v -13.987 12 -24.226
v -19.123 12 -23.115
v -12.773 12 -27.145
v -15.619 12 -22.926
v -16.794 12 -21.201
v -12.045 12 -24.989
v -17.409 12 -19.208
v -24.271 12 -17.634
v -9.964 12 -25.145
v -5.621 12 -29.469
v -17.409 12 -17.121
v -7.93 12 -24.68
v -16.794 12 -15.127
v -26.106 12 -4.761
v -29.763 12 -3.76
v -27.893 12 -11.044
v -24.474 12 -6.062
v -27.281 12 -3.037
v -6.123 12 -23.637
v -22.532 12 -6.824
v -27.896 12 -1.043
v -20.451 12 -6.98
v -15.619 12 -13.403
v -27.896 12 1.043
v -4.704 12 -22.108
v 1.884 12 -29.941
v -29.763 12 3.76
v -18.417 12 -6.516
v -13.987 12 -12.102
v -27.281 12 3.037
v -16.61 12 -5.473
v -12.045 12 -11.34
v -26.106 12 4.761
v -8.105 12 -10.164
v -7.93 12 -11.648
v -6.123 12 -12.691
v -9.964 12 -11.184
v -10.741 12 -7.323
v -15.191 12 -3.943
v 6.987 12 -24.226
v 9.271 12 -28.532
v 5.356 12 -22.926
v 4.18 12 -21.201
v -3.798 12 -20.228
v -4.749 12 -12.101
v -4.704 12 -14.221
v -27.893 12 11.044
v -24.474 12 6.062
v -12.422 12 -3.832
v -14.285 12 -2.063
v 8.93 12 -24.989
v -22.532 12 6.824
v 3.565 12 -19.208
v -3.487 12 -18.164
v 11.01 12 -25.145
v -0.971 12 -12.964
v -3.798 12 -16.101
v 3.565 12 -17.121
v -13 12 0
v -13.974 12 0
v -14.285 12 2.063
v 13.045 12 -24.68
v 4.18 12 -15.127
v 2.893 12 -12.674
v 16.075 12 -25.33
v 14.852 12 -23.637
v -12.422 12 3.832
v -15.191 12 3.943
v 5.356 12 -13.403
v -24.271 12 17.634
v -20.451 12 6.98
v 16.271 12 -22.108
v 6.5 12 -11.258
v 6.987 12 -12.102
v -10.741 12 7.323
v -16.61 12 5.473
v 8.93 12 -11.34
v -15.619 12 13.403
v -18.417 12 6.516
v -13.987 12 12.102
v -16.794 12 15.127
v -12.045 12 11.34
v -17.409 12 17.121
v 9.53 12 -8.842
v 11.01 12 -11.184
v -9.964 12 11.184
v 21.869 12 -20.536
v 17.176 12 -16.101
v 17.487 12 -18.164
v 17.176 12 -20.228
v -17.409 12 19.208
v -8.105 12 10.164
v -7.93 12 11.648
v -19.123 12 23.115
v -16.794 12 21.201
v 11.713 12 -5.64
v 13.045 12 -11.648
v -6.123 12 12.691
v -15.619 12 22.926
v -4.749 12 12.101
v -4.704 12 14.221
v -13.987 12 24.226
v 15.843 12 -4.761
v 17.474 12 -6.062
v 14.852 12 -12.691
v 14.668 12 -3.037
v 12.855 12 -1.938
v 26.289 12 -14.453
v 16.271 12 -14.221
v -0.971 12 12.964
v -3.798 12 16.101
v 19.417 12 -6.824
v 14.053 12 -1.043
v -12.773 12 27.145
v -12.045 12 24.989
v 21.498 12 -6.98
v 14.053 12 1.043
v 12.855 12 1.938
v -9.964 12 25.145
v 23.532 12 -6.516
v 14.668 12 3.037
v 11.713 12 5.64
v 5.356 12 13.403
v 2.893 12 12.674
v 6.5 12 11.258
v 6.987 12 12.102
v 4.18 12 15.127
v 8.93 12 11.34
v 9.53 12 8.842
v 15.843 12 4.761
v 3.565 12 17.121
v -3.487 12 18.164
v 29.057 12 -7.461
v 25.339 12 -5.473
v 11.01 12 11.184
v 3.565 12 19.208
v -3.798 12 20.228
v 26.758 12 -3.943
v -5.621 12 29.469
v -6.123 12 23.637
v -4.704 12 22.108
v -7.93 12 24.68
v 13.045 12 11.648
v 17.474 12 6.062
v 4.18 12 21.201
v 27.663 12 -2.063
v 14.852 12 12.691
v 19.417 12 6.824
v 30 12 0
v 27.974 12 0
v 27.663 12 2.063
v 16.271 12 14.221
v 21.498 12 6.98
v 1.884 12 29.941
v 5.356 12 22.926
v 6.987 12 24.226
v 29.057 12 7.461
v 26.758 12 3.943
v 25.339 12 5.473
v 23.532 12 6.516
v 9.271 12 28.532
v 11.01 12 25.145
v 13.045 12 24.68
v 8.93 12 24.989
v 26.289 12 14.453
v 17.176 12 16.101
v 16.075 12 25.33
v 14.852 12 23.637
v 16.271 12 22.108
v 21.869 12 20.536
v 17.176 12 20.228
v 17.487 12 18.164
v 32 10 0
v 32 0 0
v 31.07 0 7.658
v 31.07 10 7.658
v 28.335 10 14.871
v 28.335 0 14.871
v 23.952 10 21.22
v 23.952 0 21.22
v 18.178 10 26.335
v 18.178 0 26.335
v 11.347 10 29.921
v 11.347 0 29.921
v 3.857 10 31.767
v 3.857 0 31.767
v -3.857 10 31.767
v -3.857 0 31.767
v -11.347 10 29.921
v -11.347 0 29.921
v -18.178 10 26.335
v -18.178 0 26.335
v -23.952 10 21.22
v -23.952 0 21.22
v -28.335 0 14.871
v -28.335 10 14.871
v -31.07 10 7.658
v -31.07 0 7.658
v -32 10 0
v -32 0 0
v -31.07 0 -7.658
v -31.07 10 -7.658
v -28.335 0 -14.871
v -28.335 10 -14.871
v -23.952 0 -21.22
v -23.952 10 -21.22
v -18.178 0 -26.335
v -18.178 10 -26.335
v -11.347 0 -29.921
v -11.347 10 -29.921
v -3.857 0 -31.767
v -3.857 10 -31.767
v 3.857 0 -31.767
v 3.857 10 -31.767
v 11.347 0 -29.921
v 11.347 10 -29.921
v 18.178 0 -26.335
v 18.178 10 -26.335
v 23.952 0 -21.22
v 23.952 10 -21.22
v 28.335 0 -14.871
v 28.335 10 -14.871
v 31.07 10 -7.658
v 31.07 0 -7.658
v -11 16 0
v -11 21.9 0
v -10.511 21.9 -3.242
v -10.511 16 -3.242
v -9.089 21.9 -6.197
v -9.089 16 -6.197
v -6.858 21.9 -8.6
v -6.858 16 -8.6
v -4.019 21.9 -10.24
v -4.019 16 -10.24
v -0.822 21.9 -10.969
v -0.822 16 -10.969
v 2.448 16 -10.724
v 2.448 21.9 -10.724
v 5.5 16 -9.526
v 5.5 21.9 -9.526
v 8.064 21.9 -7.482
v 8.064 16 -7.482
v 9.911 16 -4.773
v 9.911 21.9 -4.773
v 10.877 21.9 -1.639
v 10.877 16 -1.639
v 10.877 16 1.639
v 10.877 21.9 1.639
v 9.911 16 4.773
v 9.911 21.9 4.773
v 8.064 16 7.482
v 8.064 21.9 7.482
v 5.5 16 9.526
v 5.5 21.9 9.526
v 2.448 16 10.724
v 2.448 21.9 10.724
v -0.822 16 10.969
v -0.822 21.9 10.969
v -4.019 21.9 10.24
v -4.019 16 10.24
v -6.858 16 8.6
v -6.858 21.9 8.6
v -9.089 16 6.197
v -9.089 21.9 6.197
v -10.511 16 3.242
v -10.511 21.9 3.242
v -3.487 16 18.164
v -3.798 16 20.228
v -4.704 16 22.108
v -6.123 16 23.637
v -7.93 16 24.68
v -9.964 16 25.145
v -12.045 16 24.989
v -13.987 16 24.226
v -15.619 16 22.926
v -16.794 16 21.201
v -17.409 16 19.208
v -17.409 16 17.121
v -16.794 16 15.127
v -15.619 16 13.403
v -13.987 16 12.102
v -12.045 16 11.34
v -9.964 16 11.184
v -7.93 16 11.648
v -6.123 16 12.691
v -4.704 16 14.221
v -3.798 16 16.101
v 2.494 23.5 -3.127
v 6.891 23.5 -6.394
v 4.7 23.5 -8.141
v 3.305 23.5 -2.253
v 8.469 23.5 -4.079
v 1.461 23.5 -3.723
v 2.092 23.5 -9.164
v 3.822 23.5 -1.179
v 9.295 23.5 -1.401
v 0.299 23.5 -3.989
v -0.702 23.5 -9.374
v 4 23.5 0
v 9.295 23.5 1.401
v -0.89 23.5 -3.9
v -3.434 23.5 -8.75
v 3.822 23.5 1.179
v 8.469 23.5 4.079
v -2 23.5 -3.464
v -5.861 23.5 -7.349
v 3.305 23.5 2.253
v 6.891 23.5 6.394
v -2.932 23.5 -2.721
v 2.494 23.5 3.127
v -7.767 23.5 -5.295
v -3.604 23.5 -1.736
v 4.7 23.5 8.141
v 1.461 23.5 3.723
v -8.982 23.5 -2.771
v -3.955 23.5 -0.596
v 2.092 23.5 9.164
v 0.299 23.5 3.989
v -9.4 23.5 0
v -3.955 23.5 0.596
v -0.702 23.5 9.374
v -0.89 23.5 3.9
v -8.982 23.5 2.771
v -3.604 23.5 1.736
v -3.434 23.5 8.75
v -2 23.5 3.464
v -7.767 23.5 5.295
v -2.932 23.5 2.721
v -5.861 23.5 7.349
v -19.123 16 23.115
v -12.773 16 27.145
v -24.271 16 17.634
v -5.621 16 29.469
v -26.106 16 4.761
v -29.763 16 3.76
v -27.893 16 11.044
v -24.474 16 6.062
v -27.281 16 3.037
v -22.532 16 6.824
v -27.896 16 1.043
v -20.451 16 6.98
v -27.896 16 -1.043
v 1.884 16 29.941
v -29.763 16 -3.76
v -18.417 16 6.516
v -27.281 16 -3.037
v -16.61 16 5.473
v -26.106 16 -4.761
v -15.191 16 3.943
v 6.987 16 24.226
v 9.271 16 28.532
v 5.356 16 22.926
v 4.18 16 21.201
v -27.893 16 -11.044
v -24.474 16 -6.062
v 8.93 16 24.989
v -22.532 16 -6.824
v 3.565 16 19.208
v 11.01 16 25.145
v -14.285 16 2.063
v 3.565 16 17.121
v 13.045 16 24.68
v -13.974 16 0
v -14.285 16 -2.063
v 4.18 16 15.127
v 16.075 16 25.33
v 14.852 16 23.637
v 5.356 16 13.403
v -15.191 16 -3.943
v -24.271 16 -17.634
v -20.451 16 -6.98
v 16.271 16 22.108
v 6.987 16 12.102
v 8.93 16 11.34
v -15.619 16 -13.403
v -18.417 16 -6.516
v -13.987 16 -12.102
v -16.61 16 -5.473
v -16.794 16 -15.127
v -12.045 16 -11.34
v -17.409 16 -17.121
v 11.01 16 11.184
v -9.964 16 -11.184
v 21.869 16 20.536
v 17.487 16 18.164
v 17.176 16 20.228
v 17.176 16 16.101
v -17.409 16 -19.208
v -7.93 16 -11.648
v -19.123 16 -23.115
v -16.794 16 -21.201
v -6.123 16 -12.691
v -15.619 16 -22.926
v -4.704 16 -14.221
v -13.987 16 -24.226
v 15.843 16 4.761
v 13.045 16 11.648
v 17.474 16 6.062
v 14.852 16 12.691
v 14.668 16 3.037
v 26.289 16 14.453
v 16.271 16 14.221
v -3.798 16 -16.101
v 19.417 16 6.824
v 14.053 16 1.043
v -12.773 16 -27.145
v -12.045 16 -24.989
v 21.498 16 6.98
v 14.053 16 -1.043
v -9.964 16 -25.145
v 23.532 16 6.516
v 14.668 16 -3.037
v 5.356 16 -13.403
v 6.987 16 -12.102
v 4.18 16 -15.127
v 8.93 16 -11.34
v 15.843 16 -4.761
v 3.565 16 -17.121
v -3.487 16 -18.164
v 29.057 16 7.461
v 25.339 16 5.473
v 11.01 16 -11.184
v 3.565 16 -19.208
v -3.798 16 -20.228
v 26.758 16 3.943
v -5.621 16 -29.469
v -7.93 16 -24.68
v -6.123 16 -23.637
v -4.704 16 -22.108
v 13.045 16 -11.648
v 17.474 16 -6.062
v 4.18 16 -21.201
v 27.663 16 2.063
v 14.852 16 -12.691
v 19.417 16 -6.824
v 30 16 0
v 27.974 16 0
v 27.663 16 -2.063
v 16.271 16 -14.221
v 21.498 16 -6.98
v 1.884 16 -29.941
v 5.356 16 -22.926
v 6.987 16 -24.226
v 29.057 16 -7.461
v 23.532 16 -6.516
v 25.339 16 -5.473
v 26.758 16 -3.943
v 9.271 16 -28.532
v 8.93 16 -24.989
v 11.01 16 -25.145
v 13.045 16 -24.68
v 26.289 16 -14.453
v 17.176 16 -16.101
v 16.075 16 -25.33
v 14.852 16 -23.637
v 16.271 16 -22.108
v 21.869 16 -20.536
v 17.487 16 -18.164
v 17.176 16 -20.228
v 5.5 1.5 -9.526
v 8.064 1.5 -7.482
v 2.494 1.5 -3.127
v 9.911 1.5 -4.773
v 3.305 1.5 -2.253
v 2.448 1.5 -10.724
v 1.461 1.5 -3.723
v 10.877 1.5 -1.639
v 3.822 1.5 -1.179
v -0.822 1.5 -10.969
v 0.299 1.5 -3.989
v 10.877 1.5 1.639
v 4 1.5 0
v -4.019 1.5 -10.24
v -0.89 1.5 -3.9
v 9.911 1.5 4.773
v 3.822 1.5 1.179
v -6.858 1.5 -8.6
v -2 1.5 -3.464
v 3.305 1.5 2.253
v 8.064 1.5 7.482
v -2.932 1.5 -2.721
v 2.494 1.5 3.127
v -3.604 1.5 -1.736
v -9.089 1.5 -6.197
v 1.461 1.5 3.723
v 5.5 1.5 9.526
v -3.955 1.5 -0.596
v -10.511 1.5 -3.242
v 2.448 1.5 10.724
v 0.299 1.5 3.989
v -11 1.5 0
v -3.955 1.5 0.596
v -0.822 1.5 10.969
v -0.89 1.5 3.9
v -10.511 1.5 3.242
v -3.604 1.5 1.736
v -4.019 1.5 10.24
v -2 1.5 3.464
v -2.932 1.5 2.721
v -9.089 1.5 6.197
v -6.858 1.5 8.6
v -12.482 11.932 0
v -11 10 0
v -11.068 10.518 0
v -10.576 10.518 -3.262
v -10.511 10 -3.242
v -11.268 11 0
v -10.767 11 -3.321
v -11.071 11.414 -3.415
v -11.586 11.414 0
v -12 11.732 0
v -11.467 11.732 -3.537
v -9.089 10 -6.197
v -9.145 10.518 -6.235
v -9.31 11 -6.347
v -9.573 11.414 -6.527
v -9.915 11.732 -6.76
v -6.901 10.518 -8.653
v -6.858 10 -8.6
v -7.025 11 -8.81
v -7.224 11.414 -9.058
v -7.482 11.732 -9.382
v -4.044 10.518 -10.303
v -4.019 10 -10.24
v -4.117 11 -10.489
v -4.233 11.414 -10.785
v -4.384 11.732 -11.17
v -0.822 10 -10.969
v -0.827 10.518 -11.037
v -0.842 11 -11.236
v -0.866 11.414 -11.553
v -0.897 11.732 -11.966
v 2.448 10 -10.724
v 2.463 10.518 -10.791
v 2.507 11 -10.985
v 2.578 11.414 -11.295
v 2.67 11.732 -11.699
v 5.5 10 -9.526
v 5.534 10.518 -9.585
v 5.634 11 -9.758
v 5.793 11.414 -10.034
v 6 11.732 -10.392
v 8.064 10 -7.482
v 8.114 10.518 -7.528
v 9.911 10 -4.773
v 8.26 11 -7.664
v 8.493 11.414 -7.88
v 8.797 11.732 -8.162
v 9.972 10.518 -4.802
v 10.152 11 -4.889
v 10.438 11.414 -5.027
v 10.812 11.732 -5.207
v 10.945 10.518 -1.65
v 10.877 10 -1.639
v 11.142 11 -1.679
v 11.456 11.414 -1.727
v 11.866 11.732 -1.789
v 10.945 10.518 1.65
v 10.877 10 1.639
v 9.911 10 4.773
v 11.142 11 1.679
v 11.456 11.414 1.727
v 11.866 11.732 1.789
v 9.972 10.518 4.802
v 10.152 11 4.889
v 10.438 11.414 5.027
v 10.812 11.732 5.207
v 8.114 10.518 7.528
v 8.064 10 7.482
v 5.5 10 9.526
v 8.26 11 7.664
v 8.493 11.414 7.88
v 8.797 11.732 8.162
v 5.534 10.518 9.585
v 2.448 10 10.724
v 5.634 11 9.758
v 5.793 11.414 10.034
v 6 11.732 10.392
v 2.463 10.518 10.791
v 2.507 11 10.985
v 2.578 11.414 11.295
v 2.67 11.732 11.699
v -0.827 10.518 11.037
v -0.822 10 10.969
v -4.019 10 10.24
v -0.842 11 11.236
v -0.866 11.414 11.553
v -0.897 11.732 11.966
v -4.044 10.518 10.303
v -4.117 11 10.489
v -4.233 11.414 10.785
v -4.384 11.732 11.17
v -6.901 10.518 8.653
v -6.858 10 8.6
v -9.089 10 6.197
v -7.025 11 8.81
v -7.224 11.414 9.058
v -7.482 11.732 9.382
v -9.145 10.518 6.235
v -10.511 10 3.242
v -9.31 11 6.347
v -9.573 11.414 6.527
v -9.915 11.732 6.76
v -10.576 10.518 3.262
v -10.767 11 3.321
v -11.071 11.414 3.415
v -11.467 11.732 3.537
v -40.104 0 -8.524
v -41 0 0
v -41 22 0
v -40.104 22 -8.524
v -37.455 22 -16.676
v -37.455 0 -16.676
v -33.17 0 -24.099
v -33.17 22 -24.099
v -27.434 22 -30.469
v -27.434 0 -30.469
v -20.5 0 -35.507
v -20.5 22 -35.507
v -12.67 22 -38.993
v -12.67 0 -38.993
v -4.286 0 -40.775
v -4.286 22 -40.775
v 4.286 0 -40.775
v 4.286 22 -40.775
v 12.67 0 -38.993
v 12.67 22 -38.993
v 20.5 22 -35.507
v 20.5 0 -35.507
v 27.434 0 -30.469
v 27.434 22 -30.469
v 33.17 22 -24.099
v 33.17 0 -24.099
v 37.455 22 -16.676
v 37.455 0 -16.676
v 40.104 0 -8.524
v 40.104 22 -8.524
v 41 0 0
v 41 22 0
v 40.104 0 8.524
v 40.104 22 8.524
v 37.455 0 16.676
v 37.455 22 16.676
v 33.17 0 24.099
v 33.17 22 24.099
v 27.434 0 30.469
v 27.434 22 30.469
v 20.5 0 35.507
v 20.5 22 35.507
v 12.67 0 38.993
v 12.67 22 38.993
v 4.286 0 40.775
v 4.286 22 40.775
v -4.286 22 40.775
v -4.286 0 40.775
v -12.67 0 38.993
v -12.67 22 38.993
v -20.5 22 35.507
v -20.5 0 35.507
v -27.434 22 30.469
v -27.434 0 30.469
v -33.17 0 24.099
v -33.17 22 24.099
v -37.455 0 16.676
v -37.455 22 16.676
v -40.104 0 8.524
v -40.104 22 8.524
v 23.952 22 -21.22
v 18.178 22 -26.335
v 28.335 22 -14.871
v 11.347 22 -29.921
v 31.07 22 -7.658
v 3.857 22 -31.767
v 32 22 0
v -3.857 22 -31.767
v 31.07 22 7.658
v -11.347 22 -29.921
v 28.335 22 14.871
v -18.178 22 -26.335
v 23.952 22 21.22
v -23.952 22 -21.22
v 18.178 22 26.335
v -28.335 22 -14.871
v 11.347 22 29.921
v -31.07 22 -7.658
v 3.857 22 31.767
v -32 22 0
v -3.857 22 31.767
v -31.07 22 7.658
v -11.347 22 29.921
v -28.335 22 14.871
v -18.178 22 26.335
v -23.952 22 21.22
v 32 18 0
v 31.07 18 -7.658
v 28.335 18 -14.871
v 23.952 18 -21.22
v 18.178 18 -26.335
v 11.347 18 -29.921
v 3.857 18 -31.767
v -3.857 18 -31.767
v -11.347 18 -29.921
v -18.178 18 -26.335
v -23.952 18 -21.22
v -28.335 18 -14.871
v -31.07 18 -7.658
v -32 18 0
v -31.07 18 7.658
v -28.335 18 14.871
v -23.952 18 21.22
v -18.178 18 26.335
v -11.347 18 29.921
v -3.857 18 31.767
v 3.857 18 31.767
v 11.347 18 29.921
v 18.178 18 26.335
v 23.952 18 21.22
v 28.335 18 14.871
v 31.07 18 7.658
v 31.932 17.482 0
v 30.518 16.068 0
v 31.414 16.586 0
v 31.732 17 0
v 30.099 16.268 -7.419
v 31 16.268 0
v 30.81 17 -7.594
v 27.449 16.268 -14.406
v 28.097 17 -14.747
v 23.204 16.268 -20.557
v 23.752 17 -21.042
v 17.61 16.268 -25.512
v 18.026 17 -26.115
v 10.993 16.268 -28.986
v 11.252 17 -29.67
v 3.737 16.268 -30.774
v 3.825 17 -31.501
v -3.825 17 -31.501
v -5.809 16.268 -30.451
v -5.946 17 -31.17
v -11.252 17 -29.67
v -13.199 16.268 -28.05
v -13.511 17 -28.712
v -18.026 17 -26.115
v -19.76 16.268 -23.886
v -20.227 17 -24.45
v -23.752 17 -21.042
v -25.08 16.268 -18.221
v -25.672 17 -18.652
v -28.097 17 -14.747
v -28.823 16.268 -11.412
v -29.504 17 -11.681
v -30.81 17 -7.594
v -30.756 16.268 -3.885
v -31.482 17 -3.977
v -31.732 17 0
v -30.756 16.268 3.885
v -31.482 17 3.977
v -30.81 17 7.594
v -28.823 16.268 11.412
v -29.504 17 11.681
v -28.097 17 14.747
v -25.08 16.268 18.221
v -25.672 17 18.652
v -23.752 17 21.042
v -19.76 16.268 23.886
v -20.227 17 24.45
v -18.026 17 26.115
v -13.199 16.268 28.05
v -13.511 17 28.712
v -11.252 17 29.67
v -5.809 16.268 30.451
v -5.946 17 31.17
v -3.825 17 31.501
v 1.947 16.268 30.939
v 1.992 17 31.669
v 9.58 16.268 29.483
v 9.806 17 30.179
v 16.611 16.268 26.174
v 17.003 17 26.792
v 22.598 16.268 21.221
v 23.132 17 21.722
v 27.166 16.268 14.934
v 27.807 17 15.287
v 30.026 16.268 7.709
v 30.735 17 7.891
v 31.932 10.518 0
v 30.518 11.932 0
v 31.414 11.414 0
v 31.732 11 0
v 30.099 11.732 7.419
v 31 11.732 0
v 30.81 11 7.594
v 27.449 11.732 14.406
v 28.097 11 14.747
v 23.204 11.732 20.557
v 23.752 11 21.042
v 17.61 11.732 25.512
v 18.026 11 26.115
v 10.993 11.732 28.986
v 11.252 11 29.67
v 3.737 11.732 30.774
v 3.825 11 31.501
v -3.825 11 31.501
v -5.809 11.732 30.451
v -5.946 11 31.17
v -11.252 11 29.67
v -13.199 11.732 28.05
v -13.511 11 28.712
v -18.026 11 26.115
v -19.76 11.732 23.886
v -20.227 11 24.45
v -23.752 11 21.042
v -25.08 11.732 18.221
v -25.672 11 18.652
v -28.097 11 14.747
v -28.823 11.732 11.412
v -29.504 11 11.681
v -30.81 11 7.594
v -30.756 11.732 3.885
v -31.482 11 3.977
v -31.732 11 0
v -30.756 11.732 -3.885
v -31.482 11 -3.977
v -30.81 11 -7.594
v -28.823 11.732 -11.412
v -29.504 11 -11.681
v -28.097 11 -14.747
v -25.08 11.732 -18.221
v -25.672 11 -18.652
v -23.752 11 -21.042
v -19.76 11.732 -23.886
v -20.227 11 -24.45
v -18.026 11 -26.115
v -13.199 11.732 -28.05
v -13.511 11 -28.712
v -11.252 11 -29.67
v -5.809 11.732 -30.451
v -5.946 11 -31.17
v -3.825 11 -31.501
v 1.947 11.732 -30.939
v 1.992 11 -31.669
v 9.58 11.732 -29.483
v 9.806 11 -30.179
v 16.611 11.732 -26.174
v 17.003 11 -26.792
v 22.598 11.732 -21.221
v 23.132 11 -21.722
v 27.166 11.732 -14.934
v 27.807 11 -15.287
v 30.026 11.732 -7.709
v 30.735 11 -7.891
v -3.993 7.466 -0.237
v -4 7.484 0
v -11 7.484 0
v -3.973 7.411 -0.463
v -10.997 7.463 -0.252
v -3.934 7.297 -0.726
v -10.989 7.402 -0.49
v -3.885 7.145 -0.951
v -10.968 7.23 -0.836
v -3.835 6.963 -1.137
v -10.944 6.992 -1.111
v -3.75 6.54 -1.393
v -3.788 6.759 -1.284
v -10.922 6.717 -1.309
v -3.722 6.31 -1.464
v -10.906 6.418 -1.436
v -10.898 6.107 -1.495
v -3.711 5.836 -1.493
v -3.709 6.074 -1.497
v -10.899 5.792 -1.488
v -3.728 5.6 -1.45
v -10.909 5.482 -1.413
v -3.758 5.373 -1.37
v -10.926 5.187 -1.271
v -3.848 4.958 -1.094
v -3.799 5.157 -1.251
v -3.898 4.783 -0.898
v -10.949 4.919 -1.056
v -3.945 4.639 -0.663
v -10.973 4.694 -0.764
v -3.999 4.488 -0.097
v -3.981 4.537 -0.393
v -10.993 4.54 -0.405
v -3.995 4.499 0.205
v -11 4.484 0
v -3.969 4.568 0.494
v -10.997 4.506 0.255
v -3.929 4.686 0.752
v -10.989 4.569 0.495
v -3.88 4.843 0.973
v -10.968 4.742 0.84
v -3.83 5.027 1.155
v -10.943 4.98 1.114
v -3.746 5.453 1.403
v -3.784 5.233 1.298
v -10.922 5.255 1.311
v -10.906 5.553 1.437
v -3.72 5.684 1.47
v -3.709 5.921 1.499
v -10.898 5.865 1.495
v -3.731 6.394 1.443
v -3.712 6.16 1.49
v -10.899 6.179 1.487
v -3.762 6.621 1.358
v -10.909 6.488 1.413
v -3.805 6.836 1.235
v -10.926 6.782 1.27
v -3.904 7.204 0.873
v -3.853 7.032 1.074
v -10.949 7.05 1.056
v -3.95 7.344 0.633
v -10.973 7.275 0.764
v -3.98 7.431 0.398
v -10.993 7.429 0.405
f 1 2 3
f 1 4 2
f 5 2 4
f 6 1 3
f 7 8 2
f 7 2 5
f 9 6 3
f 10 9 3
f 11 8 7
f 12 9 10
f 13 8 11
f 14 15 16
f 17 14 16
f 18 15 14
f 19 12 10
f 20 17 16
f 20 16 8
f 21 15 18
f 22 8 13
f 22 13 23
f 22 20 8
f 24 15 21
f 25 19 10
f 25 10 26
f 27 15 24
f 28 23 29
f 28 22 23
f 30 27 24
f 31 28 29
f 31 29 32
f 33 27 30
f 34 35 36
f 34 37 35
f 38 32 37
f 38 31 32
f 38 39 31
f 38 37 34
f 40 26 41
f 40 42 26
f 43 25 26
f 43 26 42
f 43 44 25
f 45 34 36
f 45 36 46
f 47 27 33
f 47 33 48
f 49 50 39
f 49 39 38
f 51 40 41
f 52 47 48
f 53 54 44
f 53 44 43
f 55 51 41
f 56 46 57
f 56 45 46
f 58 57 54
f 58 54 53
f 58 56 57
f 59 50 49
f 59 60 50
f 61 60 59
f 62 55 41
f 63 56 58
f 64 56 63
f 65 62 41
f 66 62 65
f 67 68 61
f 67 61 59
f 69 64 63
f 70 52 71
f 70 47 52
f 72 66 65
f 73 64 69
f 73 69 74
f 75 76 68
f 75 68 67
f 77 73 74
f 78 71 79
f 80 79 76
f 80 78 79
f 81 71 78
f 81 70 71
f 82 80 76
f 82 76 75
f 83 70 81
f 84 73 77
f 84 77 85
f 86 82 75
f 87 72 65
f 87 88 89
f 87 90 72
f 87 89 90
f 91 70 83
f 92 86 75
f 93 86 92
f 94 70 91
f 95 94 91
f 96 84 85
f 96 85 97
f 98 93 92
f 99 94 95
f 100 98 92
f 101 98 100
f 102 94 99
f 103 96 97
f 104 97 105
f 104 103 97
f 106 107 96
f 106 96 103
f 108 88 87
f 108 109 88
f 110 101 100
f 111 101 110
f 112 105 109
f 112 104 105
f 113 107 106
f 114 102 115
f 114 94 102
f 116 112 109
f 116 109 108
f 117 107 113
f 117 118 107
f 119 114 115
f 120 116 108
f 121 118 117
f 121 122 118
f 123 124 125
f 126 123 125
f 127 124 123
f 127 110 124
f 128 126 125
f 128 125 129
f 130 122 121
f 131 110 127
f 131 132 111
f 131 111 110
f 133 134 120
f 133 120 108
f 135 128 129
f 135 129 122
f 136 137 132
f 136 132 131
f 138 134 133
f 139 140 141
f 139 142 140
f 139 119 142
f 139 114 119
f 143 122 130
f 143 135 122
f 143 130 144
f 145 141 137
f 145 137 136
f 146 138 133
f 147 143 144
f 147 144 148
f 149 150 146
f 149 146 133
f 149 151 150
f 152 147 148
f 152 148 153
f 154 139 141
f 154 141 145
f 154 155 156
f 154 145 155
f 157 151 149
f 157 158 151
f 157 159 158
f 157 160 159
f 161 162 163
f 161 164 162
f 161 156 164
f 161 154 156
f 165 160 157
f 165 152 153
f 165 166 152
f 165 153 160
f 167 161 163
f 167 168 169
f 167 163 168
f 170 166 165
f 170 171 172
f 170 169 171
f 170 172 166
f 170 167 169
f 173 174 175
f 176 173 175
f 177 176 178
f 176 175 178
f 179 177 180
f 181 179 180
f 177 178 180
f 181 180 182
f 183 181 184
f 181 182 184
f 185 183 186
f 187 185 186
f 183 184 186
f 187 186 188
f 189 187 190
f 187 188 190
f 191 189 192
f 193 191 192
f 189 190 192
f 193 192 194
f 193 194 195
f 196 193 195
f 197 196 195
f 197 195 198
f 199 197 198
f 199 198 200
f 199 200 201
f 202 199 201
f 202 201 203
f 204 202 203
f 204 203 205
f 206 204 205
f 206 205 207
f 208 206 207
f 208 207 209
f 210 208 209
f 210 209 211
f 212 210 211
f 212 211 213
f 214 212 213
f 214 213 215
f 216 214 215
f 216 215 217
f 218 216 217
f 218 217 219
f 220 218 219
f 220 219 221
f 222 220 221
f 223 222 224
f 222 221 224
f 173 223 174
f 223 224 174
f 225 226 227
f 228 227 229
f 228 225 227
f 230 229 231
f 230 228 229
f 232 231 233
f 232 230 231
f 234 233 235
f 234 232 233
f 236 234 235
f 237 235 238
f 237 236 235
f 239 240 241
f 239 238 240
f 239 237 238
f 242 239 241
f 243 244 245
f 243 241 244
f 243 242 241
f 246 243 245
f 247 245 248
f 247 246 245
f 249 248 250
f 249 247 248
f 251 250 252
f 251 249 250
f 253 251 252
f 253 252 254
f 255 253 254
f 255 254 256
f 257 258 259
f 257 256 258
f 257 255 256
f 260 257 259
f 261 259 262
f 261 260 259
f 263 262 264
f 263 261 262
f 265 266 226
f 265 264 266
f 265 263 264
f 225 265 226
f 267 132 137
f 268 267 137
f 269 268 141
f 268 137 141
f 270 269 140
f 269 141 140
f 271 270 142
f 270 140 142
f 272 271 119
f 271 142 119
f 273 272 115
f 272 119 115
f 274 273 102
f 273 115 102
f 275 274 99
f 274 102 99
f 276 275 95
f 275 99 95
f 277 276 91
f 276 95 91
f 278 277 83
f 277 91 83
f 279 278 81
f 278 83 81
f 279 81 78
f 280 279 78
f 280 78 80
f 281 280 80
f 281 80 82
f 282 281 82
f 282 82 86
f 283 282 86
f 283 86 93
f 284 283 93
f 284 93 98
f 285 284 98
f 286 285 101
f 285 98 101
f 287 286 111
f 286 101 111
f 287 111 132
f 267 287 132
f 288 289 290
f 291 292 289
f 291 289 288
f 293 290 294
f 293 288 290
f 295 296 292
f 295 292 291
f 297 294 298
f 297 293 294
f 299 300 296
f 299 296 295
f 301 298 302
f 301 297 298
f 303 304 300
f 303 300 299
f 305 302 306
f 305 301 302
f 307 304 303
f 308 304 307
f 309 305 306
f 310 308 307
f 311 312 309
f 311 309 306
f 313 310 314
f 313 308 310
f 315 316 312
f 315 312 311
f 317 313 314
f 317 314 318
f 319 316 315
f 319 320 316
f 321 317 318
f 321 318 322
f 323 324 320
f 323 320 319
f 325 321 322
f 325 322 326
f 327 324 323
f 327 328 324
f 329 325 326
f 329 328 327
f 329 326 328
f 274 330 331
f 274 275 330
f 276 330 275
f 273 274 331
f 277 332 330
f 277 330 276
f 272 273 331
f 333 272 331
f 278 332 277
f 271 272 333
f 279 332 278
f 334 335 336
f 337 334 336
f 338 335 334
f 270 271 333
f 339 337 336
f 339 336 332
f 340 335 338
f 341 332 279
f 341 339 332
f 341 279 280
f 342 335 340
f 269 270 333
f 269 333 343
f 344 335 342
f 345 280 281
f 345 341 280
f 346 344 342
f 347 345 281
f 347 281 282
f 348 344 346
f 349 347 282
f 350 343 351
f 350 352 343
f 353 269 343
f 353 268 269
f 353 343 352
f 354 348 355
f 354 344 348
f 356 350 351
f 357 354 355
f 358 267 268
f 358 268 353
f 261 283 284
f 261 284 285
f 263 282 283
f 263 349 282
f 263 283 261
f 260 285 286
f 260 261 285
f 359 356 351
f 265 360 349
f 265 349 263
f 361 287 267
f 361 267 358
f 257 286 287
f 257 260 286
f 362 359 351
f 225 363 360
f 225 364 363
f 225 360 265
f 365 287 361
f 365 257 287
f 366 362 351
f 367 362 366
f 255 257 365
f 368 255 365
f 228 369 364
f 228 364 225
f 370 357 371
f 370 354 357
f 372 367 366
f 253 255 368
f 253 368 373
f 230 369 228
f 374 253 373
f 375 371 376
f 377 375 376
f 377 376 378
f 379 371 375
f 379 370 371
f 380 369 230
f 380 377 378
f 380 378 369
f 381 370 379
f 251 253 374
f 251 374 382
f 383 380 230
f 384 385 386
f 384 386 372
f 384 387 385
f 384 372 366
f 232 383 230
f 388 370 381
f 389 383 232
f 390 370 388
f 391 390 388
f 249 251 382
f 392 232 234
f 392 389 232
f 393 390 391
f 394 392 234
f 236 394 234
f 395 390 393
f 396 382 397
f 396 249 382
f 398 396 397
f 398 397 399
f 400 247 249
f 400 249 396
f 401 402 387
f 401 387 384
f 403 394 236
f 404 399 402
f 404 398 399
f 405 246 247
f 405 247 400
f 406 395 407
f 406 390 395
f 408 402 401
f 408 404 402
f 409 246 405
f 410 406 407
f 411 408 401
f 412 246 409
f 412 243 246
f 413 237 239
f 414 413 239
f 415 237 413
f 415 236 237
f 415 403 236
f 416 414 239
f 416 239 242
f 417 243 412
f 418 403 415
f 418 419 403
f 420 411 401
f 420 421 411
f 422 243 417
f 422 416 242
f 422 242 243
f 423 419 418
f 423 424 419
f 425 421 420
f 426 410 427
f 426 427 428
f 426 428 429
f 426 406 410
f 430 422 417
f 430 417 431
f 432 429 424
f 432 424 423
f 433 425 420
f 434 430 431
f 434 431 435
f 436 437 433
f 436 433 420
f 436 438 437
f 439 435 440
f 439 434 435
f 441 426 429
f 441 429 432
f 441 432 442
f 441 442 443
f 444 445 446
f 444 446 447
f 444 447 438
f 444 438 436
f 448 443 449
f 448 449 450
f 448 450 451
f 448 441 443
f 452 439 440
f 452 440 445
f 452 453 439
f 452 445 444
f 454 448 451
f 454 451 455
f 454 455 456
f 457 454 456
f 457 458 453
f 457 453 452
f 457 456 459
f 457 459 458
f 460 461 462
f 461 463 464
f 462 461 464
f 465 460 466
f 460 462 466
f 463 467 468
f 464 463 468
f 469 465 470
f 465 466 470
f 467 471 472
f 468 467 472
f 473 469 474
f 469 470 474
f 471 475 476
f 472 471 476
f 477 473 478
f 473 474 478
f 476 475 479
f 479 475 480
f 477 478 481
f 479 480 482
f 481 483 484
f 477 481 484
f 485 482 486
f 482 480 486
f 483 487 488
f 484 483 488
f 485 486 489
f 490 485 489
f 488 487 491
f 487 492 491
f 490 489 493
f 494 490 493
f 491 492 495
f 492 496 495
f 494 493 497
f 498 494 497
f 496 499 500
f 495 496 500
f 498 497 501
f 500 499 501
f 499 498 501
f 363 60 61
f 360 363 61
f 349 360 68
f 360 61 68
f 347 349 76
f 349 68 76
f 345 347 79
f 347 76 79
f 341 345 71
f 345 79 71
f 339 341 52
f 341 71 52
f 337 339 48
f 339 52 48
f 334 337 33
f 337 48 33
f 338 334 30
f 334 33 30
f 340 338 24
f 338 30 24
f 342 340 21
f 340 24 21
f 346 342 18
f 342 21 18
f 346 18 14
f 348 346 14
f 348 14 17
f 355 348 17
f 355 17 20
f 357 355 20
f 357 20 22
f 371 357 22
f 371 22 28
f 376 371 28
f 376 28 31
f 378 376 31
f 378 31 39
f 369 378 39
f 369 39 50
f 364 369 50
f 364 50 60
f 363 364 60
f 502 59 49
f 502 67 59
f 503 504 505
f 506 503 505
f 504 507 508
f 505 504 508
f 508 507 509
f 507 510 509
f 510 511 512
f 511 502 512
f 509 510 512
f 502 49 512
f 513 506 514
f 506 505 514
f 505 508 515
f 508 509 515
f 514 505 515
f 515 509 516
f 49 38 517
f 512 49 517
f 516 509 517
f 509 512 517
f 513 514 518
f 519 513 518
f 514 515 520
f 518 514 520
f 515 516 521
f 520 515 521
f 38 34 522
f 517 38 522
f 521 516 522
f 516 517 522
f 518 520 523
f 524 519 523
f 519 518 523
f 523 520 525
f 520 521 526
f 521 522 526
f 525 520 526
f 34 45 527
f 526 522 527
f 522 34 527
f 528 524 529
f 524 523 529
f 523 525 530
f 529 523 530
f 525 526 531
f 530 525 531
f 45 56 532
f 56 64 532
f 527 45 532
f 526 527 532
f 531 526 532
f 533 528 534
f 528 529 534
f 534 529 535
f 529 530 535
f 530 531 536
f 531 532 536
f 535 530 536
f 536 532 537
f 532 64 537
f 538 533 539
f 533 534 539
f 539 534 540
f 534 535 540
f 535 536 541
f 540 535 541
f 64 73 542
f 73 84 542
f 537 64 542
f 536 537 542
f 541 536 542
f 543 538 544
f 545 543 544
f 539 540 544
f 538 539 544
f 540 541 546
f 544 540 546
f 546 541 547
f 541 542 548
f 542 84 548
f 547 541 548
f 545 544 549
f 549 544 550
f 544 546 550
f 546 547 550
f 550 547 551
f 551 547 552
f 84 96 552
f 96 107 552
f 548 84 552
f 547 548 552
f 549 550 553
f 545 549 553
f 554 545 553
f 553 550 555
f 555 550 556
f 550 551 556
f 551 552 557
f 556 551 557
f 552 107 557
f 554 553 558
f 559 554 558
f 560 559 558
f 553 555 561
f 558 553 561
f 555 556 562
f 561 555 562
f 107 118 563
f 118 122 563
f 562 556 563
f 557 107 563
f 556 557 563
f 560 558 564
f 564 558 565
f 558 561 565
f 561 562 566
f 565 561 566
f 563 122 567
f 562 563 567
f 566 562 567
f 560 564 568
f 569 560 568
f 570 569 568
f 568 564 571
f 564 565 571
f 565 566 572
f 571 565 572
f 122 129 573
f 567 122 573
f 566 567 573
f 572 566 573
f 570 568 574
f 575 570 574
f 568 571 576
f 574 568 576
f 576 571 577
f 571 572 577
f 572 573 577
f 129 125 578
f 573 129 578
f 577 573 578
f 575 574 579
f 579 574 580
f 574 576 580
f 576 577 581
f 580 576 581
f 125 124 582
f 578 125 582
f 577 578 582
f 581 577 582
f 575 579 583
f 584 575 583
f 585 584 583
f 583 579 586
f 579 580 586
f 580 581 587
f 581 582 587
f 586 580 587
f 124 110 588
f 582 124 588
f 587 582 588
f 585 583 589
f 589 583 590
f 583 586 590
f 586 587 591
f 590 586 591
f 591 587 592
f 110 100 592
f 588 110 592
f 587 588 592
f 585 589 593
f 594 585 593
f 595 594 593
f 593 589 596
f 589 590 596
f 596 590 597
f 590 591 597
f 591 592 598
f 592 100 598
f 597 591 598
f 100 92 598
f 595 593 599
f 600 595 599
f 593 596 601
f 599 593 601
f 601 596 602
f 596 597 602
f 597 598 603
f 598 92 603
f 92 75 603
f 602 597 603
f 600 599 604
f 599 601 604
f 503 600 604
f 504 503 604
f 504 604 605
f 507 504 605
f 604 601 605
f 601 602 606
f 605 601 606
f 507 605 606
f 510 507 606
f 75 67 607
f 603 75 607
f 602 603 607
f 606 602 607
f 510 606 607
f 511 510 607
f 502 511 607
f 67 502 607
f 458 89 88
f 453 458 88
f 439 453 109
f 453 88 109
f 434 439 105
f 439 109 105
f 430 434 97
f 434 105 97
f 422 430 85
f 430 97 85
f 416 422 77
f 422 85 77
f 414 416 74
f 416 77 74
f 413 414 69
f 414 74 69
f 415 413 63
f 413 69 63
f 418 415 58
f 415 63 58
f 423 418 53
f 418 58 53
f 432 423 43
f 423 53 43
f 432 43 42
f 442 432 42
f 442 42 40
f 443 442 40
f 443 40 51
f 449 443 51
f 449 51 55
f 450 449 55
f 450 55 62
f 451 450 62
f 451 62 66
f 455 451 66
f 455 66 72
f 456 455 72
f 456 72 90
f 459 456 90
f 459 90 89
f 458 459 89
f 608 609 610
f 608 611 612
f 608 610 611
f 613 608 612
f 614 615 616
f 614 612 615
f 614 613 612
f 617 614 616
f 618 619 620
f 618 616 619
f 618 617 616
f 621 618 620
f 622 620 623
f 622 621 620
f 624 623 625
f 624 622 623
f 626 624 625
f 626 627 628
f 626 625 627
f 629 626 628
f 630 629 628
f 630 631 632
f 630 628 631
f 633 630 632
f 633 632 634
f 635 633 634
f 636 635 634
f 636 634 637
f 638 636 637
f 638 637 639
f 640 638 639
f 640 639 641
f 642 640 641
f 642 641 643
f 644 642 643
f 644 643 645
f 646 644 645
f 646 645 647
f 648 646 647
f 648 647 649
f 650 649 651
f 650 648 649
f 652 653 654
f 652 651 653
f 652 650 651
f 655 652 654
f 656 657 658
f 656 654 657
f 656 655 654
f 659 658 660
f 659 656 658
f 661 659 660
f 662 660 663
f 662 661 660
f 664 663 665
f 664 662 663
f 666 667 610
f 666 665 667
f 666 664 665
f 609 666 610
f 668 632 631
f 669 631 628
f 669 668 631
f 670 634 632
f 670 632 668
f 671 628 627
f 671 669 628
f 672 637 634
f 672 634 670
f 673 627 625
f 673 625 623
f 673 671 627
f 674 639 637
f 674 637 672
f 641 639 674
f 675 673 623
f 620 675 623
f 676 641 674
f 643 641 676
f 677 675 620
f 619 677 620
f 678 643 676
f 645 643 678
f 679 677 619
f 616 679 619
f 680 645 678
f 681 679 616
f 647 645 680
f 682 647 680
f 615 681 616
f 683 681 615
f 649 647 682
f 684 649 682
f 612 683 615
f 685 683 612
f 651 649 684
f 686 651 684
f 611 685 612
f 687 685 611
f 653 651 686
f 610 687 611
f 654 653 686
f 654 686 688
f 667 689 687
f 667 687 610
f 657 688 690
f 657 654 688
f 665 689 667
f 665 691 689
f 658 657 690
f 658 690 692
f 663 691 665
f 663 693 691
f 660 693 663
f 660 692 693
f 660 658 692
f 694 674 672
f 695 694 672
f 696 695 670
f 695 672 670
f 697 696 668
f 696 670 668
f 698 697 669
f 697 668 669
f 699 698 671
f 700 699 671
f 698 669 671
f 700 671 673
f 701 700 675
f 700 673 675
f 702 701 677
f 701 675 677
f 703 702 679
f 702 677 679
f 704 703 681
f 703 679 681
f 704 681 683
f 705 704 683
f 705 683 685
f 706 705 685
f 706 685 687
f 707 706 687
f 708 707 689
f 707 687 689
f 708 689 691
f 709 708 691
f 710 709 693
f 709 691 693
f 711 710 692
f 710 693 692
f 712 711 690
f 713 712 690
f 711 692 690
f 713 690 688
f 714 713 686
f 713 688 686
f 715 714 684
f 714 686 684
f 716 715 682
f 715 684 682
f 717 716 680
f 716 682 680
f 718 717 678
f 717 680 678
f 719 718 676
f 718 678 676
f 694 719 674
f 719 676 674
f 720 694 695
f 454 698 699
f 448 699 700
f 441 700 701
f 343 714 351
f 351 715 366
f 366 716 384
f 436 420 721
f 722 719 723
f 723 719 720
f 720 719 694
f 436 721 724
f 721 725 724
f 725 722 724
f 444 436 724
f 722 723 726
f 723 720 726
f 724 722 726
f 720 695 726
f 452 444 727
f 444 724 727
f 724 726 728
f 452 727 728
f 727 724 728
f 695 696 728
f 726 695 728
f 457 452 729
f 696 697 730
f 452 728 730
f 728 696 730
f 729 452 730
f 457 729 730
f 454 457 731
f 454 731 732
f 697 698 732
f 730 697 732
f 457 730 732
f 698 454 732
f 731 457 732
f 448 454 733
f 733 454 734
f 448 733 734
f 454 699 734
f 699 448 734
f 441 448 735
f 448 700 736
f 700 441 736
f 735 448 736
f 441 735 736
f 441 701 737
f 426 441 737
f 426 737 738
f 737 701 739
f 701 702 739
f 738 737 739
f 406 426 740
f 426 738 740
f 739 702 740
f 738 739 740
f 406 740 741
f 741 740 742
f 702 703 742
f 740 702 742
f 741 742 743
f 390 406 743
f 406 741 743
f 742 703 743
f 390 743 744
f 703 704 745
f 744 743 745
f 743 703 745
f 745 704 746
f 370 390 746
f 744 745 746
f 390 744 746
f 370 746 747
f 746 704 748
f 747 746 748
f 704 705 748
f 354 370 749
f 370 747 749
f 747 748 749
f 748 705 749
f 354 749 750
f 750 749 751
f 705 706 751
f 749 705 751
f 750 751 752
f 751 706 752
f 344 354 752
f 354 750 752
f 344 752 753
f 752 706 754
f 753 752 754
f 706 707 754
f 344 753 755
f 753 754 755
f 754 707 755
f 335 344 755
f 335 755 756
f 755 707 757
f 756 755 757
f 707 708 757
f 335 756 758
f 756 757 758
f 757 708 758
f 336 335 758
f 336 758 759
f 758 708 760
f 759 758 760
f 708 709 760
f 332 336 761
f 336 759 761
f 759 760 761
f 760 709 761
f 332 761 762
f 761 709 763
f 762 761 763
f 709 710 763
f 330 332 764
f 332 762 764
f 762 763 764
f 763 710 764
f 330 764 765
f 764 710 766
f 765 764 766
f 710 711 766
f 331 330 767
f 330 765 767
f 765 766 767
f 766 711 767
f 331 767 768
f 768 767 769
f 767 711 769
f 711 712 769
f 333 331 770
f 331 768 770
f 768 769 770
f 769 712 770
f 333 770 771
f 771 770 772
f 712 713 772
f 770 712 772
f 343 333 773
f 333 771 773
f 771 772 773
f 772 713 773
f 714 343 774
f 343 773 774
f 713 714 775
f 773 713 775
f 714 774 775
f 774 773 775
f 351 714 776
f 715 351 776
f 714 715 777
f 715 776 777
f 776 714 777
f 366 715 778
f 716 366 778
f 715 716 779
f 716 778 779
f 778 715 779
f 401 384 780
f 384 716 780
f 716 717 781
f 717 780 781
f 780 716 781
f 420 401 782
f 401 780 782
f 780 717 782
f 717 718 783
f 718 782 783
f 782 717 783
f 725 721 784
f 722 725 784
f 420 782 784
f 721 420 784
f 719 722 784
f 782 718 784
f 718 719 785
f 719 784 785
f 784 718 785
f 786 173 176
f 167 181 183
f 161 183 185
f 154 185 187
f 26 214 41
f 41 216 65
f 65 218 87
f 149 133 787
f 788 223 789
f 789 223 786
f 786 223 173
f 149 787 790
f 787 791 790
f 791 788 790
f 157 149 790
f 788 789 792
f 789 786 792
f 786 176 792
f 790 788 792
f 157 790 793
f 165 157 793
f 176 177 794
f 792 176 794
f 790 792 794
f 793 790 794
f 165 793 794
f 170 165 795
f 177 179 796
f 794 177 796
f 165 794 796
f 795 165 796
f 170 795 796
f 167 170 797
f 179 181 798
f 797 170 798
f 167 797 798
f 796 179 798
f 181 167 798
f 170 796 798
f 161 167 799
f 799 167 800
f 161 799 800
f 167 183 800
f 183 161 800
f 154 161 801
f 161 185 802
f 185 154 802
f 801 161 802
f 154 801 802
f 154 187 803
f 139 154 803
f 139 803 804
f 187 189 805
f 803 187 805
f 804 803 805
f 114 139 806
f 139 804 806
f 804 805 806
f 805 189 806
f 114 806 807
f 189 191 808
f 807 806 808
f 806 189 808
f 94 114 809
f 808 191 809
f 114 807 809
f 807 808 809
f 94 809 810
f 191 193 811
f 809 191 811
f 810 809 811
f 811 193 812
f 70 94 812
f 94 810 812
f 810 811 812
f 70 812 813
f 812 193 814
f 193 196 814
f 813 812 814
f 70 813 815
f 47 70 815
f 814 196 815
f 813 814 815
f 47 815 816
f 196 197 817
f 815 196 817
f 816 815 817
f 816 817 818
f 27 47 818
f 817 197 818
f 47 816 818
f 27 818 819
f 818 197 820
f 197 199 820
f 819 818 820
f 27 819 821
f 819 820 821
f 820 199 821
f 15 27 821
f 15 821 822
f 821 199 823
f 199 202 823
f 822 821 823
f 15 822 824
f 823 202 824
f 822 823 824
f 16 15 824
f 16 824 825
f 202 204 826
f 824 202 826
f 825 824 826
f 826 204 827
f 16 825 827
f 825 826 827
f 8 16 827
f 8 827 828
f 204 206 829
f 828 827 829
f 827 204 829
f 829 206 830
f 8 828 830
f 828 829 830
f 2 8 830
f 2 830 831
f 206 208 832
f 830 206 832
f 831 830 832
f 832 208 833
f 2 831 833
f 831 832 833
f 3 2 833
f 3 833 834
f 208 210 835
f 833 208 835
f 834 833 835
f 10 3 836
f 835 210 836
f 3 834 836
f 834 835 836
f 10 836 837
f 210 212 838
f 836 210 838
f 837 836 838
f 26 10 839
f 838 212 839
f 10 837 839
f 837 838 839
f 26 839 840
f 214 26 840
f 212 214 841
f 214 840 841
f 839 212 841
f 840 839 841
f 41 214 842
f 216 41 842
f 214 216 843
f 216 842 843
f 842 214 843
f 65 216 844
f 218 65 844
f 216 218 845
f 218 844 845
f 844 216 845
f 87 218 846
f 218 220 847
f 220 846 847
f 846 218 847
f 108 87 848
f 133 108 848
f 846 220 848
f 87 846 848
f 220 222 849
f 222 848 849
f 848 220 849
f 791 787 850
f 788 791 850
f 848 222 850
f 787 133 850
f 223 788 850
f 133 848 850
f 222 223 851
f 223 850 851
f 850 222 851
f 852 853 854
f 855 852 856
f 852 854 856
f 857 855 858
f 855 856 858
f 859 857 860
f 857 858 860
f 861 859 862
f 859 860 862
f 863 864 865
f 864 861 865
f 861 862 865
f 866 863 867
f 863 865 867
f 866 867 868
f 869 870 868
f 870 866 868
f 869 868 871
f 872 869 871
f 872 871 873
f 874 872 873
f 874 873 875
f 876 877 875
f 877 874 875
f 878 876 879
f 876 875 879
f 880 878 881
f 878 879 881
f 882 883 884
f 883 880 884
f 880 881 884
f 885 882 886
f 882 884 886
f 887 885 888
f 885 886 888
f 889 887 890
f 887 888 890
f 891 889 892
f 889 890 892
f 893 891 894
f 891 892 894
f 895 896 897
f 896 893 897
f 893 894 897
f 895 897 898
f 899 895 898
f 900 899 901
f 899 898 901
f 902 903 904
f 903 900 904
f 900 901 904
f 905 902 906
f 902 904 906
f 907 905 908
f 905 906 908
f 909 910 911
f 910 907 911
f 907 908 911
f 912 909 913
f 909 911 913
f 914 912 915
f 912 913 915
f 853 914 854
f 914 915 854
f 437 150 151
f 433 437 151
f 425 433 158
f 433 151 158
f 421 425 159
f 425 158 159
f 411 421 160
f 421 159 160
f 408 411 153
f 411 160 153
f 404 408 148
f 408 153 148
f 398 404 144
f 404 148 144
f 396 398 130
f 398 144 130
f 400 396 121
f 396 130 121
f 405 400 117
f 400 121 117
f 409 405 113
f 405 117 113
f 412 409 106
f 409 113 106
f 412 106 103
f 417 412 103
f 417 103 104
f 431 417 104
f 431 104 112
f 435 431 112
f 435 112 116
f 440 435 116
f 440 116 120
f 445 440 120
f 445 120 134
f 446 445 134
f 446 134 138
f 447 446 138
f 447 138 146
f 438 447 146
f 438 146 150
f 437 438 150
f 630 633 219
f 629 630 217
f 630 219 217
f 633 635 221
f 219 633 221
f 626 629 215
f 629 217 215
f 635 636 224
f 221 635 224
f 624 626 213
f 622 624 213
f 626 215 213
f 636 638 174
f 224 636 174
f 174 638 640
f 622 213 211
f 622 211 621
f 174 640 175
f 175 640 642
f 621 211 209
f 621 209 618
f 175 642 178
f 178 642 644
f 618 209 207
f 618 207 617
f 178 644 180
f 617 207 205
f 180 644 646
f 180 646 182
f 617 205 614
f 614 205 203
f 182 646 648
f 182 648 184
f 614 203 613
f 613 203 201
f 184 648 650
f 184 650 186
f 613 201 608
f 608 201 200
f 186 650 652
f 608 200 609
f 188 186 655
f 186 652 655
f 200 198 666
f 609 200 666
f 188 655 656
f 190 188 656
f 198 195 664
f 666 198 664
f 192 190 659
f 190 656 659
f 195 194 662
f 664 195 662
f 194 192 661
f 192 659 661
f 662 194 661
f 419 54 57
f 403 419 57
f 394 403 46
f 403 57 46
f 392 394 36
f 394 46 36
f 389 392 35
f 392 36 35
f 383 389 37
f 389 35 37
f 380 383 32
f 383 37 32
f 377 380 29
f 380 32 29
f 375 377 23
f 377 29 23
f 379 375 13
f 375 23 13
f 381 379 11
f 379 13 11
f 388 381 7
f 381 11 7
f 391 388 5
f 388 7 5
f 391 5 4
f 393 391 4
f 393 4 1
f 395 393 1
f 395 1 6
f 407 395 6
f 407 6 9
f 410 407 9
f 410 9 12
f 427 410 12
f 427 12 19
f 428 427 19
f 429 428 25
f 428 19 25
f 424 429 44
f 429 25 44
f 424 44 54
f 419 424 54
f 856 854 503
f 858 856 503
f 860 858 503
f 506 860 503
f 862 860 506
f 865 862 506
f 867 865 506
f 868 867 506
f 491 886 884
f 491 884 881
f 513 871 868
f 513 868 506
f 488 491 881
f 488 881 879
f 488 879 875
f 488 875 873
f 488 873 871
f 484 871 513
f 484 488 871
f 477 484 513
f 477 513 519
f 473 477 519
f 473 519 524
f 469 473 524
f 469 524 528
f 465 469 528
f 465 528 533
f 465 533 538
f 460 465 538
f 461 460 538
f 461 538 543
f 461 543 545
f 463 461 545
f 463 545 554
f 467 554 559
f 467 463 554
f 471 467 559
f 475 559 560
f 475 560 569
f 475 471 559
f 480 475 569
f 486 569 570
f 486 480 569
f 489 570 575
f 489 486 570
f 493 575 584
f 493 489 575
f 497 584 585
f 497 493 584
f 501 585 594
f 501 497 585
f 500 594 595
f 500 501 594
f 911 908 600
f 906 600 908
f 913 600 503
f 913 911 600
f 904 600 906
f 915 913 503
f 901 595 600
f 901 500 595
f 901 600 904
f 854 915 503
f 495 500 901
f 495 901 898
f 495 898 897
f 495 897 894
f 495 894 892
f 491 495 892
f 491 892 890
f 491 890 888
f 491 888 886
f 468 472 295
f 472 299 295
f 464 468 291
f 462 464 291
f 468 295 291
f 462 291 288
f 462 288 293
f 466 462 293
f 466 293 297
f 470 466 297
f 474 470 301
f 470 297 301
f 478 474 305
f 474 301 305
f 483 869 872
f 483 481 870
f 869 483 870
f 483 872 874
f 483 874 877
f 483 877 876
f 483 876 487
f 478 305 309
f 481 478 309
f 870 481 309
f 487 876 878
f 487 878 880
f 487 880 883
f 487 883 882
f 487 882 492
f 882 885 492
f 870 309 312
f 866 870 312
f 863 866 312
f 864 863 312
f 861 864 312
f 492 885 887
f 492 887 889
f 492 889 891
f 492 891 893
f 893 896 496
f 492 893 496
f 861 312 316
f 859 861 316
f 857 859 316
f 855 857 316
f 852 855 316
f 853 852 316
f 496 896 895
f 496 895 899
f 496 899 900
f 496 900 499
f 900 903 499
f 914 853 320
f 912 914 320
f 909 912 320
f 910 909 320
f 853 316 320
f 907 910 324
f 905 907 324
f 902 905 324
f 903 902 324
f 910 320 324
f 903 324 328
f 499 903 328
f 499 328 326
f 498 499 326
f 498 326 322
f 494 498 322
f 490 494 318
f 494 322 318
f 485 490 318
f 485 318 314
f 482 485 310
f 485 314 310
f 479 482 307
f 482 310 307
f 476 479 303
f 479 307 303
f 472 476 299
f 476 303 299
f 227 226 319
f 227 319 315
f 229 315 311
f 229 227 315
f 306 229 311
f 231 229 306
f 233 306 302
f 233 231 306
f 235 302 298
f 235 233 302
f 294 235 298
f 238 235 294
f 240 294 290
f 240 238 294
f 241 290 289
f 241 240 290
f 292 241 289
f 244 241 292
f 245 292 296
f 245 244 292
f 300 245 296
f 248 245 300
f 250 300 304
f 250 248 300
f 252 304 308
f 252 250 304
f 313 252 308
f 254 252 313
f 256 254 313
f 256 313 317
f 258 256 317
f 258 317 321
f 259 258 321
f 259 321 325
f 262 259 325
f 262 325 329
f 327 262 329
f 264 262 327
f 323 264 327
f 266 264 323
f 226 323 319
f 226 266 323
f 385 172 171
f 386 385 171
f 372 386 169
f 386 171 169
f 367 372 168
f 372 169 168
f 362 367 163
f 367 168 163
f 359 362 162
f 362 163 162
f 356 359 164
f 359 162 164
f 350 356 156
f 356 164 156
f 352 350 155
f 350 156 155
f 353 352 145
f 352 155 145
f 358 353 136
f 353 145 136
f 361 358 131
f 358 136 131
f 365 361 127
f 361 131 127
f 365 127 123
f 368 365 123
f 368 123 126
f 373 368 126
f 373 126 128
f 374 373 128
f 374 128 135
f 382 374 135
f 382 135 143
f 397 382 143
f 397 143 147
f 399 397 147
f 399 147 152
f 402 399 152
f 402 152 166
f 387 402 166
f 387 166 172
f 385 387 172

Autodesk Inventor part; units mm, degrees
ref_plane "XY Plane" through (0, 0, 0) normal (0, 0, 1) x (1, 0, 0)
sketch "Sketch1" plane through (0, 0, 0) normal (0, 1, 0) x (-1, 0, 0)
  circle A0 centre (0, 0) radius 41
  dimension "d0" = 82
extrude "Extrusion1" add sketch "Sketch1" along normal blind 22
sketch "Sketch2" plane through (0, 22, 0) normal (0, 1, 0) x (1, 0, 0)
  circle A0 centre (0, 0) radius 32
  dimension "d3" = 64
extrude "Extrusion2" cut sketch "Sketch2" against normal blind 6
sketch "Sketch3" plane through (0, 0, 0) normal (0, -1, 0) x (1, 0, 0)
  circle A0 centre (0, 0) radius 32
  dimension "d6" = 64
extrude "Extrusion3" cut sketch "Sketch3" against normal blind 12
ref_plane "Work Plane1" through (0, 1.5, 0) normal (0, 1, 0) x (-1, 0, 0)
sketch "Sketch4" plane through (0, 1.5, 0) normal (0, 1, 0) x (-1, 0, 0)
  circle A0 centre (0, 0) radius 11
  dimension "d10" = 22
extrude "Extrusion4" add sketch "Sketch4" along normal blind 22
sketch "Sketch5" plane through (0, 23.5, 0) normal (0, 1, 0) x (1, 0, 0)
  circle A0 centre (0, 0) radius 4
  dimension "d13" = 8
extrude "Extrusion5" cut sketch "Sketch5" against normal through all
ref_plane "Work Plane2" through (-11, 0, 0) normal (1, 0, 0) x (0, 1, 0)
sketch "Sketch6" plane through (-11, 0, 0) normal (1, 0, 0) x (0, 1, 0)
  circle A0 centre (5.9844, 0) radius 1.5
  point P0 (0, 0)
  dimension "d17" = 3
  dimension "d33" = 5.9844
extrude "Extrusion6" cut sketch "Sketch6" along normal blind 10
sketch "Sketch7" plane through (0, 12, 0) normal (0, -1, 0) x (1, 0, 0)
  circle A0 centre (20.9744, 0) radius 7
  circle A1 centre (10.4872, 18.1643) radius 7
  circle A2 centre (-10.4872, 18.1643) radius 7
  circle A3 centre (-20.9744, 0) radius 7
  circle A4 centre (-10.4872, -18.1643) radius 7
  circle A5 centre (10.4872, -18.1643) radius 7
  point P0 (0, 0)
  dimension "d20" = 14
  dimension "d23" = 360
  dimension "d34" = 20.9744
extrude "Extrusion7" cut sketch "Sketch7" against normal through all
fillet "Fillet1" radius 2 1 edges at (11, 12, 0)
fillet "Fillet2" radius 2 1 edges at (-32, 12, 0)
fillet "Fillet3" radius 2 1 edges at (-32, 16, 0)
chamfer "Chamfer1" distance 1.6 angle 45 1 edges at (11, 23.5, 0)
properties part number "reverse gear fly wheel"
